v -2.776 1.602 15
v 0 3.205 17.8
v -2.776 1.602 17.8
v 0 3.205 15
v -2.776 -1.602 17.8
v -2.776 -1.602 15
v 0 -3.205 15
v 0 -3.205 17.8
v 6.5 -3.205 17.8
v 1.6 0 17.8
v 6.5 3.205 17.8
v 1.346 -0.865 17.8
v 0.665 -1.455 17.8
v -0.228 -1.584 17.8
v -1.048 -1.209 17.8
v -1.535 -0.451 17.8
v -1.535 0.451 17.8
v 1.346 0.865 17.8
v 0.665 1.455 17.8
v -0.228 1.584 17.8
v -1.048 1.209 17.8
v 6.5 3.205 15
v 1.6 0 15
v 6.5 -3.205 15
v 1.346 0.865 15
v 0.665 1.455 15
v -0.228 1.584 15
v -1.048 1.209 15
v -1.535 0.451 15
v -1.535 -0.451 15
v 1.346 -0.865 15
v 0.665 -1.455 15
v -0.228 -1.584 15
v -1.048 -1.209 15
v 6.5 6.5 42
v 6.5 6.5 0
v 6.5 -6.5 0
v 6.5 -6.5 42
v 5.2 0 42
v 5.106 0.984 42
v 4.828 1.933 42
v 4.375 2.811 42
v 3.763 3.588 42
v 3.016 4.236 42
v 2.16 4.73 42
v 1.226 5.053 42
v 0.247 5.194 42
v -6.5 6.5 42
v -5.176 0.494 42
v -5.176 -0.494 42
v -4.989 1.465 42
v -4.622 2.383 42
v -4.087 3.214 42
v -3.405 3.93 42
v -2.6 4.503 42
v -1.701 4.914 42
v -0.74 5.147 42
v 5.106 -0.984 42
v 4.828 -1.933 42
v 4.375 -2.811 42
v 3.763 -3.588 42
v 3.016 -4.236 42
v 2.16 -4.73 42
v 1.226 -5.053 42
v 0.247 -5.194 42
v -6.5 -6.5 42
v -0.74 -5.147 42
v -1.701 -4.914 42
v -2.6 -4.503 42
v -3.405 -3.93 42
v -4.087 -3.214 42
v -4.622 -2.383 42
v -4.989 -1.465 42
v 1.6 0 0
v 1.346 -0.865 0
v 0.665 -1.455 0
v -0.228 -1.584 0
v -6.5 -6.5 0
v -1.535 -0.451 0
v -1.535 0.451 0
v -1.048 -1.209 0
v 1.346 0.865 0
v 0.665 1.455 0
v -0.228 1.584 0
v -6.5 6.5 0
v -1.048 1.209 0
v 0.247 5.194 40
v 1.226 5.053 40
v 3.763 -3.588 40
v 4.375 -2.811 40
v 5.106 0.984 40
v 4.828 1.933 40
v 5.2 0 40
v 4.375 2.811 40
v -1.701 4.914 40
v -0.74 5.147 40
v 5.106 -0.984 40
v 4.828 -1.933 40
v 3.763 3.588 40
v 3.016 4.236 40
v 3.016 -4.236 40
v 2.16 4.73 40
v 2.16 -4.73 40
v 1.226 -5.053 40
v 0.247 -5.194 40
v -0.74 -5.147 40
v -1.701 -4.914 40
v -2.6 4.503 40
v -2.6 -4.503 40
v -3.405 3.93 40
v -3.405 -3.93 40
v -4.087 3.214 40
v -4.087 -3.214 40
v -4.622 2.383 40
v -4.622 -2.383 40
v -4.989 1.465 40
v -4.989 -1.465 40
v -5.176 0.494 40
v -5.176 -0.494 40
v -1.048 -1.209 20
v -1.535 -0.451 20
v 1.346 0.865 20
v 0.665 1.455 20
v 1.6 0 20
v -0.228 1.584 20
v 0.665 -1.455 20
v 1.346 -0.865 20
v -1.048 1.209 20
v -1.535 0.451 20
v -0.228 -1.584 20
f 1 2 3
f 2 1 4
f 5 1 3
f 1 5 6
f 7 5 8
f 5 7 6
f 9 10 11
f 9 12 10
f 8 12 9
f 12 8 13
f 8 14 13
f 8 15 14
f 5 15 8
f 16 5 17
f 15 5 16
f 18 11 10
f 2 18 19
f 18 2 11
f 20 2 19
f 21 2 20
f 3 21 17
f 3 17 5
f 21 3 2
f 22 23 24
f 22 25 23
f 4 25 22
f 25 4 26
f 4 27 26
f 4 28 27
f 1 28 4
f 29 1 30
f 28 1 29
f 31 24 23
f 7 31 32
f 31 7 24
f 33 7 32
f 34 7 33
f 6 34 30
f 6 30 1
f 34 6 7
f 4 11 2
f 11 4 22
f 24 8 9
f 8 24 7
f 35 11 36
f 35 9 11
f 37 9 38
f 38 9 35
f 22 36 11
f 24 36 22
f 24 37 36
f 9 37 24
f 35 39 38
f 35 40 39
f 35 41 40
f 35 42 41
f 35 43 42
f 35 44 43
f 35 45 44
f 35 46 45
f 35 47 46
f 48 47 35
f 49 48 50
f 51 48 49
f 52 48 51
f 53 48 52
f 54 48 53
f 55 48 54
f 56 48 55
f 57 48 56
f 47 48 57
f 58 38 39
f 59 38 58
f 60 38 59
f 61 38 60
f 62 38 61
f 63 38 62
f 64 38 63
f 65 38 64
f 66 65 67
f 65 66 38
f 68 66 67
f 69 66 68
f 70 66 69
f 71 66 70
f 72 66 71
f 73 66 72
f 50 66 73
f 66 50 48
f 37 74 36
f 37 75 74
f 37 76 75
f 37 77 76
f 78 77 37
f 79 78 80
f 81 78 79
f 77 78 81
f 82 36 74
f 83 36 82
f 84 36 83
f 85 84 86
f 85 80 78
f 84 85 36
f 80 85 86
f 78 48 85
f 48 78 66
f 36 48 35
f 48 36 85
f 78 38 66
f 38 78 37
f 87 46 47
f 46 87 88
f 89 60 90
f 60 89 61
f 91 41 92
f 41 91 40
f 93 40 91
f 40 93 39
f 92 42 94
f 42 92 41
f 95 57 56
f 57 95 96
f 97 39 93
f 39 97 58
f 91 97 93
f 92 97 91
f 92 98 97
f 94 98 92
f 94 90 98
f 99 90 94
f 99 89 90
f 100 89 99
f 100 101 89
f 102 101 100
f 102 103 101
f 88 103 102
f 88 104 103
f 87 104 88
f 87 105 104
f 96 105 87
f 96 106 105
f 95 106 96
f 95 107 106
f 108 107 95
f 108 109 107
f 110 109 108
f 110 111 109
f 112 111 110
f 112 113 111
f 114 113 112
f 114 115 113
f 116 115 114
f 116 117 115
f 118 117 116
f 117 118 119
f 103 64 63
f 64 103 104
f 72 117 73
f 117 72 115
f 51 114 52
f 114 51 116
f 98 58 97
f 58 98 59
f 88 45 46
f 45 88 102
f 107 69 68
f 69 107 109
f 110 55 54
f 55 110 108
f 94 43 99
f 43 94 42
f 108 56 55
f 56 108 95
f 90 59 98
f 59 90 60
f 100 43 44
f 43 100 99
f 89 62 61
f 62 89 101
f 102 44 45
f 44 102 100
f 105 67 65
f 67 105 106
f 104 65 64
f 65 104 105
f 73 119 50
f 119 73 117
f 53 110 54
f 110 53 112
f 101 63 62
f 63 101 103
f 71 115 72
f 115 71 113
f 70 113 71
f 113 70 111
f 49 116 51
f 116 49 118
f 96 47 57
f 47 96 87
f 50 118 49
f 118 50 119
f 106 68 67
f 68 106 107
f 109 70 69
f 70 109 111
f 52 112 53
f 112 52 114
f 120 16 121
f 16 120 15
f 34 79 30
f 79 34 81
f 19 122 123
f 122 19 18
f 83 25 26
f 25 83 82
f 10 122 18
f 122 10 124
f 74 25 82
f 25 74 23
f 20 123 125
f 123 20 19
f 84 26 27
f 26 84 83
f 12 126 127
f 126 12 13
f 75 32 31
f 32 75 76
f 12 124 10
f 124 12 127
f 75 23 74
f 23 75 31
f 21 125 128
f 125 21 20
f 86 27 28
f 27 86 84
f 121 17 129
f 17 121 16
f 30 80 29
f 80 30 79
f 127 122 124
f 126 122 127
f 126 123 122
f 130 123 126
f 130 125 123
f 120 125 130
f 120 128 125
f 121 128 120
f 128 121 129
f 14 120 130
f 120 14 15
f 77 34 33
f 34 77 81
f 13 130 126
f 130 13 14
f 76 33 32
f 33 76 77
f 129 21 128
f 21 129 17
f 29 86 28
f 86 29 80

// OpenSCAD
// file: config.scad
//General Settings
play=0.2; //to make fittings (add to some holes if nessesary)
//circle resolution 
$fa = 3;
$fs = 1;//0.5;

aluminum = [0.9, 0.9, 0.9];
steel = [0.8, 0.8, 0.9];
wood="BurlyWood";

//ISO/DIN Parts 
//Kugellager
kugellager_d=5+play;
kugellager_h=2.5+play;

//Mutter M2
M2_nut_d=4.38+2*play;
M2_nut_w=4+2*play;
M2_nut_h=1.6+2*play;

//Mutter M3
M3_nut_d=6.01+2*play;
M3_nut_w=5.5+2*play;
M3_nut_h=2.4+2*play;

//Mutter M4
M4_nut_d=7.66+2*play;
M4_nut_w=7+2*play;
M4_nut_h=3.2+2*play;

//Mutter M5
M5_nut_d=9.23+2*play;
M5_nut_w=8+2*play;
M5_nut_h=4+2*play;


//Mutter M8
M8_nut_d=14.38+2*play;
M8_nut_w=13+2*play;
M8_nut_h=6.8+2*play;

//LMXXUU Linear Ball Bearing
LMXXUU_d=19;
LMXXUU_l=29;

//Pully 2.5
band_w=5;
band_b=2;
band_outer_d=13;
//Ballbearing opposit for pully
band_bb_id=5;
band_bb_od=11;
band_bb_w=4;

//Bearing
B608Z_od=22+2*play;
B608Z_id=8+2*play;
B608Z_isd=13;
B608Z_h=7;

//Nema17
nema17_od=42.3;
nema17_id=22+2*play;
nema17_screw_d=31;
nema17_l=48;

//Nema17
nema23_id=38.1+2*play;
nema23_screw_d=47.14;
// main file
include <config.scad>

module magnete()
difference(){
    union(){
        translate([-13/2,-13/2,0])
            cube([13,13,42]);
    }
    
    translate([0,0,42-2])
        cylinder(h=2+1,d=10+2*play);
    
    translate([0,0,-1])
        cylinder(h=20+1,d=3+play);
    
    translate([0,0,15]){
    rotate([0,0,30])
        cylinder(h=M3_nut_h,r=M3_nut_d/2,$fn=6);        
    translate([0,-M3_nut_d/2,0])
        cube([13,M3_nut_d,M3_nut_h]);        
    }
}

magnete();
/*
        color("yellow")
        translate([160,0,25])
            magnete();
*/
